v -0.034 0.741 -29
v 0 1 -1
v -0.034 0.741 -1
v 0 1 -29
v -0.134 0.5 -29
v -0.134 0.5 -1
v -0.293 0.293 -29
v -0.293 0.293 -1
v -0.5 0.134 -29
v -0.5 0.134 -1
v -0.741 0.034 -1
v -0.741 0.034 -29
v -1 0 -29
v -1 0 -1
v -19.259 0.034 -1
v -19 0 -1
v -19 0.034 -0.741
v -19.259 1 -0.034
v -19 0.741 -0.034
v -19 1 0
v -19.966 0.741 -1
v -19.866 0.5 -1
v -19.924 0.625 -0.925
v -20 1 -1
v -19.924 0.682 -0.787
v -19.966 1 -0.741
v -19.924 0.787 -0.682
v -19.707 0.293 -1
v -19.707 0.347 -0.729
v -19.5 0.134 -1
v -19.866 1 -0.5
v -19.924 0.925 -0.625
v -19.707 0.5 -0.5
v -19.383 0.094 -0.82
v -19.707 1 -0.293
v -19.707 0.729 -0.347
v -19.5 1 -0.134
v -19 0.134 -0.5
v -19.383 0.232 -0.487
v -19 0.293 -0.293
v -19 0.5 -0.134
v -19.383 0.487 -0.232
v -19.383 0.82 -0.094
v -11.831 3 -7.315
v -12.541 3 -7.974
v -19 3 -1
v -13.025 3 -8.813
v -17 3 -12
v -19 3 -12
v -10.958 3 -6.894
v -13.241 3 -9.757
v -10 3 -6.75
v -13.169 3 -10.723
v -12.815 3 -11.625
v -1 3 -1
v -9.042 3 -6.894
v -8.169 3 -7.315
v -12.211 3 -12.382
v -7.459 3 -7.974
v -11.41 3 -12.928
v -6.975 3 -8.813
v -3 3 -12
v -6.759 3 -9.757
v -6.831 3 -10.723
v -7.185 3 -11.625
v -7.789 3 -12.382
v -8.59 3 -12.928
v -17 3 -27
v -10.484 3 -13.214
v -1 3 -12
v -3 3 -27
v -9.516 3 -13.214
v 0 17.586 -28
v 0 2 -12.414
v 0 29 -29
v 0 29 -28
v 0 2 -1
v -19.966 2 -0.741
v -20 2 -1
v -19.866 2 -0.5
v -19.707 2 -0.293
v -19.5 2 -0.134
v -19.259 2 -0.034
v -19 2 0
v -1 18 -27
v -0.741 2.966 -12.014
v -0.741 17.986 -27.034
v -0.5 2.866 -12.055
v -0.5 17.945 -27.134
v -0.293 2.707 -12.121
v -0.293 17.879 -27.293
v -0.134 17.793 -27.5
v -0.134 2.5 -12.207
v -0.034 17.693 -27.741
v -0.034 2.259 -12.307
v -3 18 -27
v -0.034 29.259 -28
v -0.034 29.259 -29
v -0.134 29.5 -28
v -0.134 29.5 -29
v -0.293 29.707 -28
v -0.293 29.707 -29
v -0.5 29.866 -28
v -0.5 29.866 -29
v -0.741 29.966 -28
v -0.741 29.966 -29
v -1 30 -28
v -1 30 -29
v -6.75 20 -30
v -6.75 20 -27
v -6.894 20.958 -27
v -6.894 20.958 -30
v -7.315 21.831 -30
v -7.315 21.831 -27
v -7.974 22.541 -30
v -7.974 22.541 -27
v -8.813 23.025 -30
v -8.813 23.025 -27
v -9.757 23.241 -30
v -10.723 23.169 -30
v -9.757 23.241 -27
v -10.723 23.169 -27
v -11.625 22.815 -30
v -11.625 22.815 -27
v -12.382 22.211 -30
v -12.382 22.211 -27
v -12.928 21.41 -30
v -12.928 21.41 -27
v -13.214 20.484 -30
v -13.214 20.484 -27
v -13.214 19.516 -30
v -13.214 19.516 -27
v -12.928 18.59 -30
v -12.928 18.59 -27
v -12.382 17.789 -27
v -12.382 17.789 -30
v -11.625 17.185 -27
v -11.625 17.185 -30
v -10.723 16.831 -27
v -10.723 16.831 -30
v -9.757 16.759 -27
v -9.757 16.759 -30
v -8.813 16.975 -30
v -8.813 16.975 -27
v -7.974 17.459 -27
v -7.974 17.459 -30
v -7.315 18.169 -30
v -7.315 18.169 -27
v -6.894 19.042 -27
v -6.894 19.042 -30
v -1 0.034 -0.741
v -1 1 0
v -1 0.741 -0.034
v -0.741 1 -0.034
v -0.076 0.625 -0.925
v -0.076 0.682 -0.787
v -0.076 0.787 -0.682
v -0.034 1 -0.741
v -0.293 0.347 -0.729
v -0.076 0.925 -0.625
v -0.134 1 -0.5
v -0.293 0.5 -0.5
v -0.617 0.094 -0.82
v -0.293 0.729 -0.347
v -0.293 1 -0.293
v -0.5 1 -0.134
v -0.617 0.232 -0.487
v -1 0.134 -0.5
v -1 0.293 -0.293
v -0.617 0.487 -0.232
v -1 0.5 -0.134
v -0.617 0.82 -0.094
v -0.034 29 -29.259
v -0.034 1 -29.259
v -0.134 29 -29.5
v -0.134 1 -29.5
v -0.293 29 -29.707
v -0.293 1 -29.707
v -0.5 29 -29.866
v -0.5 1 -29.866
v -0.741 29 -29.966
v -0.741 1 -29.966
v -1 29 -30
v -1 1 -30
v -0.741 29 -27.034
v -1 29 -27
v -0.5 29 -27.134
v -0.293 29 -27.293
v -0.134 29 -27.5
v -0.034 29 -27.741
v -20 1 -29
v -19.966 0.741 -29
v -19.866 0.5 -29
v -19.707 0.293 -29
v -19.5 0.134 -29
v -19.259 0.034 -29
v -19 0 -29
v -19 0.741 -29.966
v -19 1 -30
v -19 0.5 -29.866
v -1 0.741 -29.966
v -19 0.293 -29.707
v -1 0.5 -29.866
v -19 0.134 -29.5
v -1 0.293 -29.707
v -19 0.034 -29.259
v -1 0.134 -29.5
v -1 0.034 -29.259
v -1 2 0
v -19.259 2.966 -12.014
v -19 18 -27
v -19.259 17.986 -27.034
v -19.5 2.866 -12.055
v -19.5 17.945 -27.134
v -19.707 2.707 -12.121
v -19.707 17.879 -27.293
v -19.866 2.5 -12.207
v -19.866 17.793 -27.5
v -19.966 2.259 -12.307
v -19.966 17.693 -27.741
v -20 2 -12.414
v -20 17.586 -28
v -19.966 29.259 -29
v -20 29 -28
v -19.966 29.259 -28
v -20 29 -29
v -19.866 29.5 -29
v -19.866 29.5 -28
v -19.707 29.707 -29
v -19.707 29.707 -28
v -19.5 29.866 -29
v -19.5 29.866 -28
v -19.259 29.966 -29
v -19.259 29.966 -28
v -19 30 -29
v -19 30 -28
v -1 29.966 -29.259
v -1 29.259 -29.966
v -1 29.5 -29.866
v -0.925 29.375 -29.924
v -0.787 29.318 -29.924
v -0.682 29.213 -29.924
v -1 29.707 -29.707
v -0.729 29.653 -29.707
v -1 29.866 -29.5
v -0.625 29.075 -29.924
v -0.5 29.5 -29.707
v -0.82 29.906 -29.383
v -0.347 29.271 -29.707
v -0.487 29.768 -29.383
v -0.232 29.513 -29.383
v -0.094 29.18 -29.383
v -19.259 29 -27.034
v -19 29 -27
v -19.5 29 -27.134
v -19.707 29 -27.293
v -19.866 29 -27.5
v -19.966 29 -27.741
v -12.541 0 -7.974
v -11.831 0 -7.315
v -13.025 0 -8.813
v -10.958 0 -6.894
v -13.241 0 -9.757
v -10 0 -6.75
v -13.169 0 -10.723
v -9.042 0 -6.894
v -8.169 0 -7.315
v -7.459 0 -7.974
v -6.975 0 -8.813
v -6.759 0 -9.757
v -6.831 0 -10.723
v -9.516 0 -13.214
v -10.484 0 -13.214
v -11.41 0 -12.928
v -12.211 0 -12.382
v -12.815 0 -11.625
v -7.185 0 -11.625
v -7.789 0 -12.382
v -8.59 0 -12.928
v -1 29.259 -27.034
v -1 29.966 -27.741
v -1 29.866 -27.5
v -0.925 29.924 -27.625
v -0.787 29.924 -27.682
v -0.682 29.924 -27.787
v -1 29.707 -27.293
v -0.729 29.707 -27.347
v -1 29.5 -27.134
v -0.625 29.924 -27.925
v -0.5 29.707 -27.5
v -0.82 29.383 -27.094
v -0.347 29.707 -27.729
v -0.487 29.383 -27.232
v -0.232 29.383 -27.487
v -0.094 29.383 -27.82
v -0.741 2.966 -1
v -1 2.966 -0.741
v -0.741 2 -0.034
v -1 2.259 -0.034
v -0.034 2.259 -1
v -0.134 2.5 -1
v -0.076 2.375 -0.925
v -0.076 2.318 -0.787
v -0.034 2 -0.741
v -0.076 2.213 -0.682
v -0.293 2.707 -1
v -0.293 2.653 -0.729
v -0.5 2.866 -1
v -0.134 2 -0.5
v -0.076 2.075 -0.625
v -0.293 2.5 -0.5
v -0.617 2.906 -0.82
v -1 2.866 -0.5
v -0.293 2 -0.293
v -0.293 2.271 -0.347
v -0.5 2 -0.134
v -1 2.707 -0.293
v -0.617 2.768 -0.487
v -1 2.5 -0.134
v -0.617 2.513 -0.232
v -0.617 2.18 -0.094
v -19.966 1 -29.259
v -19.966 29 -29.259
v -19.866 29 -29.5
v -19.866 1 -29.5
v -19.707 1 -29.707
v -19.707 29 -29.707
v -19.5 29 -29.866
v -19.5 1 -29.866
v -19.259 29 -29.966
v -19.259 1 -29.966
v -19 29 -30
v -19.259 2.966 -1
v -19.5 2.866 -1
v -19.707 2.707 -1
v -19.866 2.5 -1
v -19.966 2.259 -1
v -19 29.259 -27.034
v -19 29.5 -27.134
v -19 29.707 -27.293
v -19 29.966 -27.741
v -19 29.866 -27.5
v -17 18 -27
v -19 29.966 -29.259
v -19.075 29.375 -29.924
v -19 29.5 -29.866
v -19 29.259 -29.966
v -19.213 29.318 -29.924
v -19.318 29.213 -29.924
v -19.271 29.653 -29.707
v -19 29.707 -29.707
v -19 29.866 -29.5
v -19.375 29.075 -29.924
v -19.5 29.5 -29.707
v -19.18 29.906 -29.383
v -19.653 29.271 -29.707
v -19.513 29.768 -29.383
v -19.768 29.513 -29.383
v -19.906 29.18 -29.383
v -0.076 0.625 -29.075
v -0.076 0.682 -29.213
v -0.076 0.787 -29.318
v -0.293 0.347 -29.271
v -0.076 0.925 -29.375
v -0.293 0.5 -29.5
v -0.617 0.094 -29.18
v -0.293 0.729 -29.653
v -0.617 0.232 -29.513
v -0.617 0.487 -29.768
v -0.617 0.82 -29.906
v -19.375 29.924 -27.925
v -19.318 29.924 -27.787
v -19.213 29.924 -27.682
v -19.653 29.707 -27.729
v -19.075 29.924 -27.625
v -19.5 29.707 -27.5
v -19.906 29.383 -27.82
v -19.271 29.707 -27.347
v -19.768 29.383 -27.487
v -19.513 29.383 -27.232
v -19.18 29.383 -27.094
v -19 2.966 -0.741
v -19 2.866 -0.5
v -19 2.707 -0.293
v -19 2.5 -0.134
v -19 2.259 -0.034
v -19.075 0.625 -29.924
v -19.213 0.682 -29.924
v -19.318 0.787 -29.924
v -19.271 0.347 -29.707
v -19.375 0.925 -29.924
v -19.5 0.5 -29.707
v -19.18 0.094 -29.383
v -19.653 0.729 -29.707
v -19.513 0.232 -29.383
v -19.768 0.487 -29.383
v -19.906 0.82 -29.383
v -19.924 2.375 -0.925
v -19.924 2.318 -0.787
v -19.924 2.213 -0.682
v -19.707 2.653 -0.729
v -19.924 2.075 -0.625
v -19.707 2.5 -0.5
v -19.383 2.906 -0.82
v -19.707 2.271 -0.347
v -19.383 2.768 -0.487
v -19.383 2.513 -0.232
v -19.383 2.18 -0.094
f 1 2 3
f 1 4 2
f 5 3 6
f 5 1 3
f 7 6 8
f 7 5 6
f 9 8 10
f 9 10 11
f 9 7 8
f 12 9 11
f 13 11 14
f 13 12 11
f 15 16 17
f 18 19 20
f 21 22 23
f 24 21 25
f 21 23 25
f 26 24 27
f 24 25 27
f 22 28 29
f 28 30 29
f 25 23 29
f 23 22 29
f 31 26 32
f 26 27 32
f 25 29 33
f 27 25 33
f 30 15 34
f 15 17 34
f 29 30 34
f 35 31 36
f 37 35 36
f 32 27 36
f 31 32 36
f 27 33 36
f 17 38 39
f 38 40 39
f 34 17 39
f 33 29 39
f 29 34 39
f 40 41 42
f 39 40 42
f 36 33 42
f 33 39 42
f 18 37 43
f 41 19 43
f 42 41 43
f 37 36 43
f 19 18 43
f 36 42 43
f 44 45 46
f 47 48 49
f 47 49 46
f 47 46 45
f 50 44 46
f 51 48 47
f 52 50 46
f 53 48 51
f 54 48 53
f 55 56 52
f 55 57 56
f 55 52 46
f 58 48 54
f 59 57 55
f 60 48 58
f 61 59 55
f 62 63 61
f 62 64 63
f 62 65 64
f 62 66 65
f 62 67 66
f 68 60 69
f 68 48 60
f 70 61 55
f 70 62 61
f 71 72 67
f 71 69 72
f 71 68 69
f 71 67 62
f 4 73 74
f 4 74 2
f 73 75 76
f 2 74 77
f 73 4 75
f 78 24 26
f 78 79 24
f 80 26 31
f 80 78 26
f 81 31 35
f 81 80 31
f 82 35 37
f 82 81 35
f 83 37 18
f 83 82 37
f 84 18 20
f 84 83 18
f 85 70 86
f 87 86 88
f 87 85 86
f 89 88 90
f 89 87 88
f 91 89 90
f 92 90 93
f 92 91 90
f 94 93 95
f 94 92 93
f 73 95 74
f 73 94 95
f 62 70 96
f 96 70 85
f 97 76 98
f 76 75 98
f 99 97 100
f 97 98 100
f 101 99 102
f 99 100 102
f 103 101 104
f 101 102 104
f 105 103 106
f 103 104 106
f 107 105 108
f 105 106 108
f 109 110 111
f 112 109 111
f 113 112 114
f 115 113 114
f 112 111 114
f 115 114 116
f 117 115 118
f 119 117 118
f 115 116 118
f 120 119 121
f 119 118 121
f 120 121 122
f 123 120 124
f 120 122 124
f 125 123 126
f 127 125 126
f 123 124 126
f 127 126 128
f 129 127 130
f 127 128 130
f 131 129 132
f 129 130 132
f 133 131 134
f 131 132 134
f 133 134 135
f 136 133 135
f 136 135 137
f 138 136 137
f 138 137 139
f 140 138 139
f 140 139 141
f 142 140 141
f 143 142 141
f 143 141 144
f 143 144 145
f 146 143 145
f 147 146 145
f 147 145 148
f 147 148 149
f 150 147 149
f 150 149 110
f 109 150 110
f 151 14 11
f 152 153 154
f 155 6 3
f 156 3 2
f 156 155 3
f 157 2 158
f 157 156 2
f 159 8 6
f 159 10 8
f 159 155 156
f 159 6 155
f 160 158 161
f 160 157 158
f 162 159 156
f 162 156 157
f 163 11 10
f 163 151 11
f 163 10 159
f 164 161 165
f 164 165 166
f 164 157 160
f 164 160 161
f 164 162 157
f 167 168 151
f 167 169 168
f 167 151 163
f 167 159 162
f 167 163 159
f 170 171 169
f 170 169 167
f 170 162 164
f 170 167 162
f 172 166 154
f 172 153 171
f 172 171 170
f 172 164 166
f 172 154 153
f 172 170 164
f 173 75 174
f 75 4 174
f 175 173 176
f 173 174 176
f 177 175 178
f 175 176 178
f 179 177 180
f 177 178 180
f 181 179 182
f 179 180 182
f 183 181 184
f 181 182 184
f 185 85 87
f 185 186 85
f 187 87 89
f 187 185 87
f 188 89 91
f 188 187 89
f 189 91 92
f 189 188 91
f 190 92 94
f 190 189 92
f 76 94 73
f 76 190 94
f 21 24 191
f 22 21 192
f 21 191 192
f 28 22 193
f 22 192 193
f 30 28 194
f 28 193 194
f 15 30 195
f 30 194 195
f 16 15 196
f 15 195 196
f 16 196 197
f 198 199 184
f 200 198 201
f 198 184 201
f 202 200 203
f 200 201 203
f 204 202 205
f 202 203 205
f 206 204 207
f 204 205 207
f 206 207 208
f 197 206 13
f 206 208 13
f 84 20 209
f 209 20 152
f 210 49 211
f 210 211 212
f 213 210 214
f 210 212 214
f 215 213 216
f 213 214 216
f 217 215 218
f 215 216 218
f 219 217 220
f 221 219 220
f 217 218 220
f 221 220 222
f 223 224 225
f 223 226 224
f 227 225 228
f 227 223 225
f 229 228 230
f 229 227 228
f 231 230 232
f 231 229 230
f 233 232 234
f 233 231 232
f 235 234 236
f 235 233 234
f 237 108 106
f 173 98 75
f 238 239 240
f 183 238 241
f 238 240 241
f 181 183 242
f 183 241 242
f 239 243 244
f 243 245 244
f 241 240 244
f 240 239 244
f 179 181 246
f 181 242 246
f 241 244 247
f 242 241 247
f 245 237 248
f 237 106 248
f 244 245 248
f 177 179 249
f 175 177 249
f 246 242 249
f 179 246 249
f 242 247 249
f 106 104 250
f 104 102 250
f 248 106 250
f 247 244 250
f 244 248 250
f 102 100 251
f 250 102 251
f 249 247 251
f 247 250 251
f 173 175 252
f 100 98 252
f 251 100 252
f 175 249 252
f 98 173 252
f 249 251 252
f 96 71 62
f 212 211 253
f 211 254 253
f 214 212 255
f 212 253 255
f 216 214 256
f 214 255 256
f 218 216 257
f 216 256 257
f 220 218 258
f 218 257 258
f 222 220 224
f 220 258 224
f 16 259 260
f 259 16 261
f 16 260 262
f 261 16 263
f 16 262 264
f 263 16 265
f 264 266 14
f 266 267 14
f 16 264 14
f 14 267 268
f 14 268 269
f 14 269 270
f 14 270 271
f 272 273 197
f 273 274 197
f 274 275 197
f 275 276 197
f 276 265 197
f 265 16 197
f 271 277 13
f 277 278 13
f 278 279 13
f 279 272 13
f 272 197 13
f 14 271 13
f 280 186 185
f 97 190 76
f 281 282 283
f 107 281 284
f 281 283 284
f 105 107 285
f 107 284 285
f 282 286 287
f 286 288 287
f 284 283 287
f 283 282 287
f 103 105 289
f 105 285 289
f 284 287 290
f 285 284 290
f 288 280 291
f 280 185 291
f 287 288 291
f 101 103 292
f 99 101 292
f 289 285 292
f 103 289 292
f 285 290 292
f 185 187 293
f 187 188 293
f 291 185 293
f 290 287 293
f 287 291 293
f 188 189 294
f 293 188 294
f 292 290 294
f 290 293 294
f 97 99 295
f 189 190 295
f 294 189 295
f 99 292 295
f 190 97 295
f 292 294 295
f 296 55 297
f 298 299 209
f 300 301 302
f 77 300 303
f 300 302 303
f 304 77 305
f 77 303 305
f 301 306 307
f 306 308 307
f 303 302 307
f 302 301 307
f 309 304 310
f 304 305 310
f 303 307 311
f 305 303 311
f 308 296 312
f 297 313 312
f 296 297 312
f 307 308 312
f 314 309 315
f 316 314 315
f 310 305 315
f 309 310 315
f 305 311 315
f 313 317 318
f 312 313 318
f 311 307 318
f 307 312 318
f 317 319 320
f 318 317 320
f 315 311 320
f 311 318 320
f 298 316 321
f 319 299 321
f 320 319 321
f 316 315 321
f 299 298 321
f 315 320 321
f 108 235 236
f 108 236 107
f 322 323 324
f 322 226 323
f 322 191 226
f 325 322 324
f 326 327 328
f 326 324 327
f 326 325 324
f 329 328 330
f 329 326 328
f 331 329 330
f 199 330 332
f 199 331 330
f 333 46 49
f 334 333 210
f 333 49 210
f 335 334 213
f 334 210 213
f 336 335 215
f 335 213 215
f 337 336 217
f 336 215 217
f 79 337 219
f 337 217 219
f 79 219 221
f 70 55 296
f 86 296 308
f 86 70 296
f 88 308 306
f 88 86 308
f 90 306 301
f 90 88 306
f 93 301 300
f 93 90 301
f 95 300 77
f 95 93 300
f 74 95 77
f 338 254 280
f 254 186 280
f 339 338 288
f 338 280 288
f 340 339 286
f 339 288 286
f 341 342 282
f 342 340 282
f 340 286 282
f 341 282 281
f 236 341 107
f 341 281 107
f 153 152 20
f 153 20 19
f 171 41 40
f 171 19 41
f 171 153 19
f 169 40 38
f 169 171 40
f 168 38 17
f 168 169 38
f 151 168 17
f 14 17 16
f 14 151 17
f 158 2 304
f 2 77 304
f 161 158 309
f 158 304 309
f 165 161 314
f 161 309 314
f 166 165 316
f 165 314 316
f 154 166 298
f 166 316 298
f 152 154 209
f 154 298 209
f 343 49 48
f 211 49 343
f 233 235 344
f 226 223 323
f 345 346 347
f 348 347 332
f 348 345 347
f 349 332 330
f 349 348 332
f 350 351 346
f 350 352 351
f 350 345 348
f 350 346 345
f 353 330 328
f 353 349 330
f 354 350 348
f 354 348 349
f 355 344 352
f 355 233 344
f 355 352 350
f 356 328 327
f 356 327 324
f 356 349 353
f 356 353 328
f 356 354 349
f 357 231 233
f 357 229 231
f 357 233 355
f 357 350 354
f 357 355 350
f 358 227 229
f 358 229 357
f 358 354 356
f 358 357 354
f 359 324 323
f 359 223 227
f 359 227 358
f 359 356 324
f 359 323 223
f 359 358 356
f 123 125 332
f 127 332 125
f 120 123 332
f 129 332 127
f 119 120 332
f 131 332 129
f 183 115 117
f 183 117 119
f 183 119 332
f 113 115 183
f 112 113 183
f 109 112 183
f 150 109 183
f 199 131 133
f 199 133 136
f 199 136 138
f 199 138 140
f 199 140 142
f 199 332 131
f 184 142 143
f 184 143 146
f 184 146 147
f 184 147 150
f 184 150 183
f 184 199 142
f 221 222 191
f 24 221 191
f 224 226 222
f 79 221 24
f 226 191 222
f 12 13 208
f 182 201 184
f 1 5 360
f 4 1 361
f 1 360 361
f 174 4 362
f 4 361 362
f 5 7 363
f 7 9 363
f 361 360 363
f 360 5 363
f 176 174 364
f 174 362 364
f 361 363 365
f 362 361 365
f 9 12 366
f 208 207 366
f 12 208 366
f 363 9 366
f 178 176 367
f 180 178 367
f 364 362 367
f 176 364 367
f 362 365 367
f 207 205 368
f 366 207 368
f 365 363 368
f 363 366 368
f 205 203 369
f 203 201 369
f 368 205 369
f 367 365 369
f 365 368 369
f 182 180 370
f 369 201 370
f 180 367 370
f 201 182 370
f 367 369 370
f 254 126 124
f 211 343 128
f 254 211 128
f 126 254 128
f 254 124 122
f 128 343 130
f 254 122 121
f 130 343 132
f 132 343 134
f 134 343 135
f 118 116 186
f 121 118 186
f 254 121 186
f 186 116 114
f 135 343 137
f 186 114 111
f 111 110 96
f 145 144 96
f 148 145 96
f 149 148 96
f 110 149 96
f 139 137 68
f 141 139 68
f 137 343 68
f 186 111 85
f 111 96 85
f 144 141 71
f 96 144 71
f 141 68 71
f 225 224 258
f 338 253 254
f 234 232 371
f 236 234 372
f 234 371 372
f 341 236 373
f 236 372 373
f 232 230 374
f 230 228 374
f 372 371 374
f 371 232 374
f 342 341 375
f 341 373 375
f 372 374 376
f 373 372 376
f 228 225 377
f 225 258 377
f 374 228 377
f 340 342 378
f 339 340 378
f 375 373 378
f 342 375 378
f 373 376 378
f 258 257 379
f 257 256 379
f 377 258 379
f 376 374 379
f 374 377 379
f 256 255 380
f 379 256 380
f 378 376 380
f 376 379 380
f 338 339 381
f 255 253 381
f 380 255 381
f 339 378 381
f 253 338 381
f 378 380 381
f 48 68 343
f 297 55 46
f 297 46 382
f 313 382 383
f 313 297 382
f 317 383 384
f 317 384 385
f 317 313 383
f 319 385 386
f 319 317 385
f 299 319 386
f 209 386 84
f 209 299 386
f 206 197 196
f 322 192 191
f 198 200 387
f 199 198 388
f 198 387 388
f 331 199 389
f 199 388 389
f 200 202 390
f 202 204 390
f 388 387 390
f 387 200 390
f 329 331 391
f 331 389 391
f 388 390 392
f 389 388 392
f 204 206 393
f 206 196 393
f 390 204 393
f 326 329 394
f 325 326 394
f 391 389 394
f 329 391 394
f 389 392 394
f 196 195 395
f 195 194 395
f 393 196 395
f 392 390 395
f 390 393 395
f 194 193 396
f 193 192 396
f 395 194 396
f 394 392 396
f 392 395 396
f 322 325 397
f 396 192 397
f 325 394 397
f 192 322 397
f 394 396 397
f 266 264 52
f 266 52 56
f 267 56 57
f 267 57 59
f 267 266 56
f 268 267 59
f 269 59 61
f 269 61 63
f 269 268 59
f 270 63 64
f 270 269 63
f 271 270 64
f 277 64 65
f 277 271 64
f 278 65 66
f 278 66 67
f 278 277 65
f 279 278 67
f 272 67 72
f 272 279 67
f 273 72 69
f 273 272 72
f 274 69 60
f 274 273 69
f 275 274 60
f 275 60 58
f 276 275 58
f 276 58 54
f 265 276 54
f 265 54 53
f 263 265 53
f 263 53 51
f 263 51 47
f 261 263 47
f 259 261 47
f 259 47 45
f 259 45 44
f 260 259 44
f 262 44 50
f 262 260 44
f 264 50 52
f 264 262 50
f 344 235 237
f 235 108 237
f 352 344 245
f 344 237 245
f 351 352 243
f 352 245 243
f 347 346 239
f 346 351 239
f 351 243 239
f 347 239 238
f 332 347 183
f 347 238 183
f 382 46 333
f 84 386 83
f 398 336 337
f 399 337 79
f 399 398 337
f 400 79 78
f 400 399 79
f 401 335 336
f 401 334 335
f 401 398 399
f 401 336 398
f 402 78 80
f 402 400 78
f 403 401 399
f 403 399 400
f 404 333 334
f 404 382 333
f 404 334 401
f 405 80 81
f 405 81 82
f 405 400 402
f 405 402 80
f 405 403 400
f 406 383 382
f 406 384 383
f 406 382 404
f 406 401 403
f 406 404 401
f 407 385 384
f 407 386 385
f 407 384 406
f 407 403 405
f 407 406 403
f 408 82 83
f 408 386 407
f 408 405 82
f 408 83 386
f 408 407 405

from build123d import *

# Parameters (mm, degrees)
SKETCH1_W           = 20
SKETCH1_H           = 30
SKETCH1_R           = 3.25
BOSS_EXTRUDE1_DEPTH = 3
SKETCH2_W           = 20
SKETCH2_H           = 3
BOSS_EXTRUDE2_DEPTH = 27
SKETCH3_R           = 3.25
CUT_EXTRUDE1_DEPTH  = 46.044422518
BOSS_EXTRUDE3_DEPTH = 3
FILLET1_R           = 1


with BuildPart() as part:
    # Sketch1 → Boss-Extrude1 (new body)
    with BuildSketch(Plane(origin=(0, 0, 0), x_dir=(1, 0, 0), z_dir=(0, 1, 0))):
        with Locations((-10, 15)):
            Rectangle(SKETCH1_W, SKETCH1_H)
        with Locations(Location((-10, 10, 0), (0, 0, 270))):
            Circle(SKETCH1_R, mode=Mode.SUBTRACT)
    extrude(amount=BOSS_EXTRUDE1_DEPTH)

    # Sketch2 → Boss-Extrude2 (add)
    with BuildSketch(Plane(origin=(0, 3, 0), x_dir=(1, 0, 0), z_dir=(0, 1, 0))):
        with Locations((-10, 28.5)):
            Rectangle(SKETCH2_W, SKETCH2_H)
    extrude(amount=BOSS_EXTRUDE2_DEPTH)

    # Sketch3 → Cut-Extrude1 (cut, through all)
    with BuildSketch(Plane.XY.offset(-27)):
        with Locations((-10, 20)):
            Circle(SKETCH3_R)
    extrude(amount=-CUT_EXTRUDE1_DEPTH, mode=Mode.SUBTRACT)

    # Sketch5 → Boss-Extrude3 (add)
    with BuildSketch(Plane(origin=(0, 0, 0), x_dir=(0, 0, -1), z_dir=(1, 0, 0))):
        Polygon((12, 3), (27, 18), (27, 3), align=None)
    boss_extrude3 = extrude(amount=-BOSS_EXTRUDE3_DEPTH)

    # Mirror1: Boss-Extrude3 across plane
    add(boss_extrude3.mirror(Plane.ZY.offset(10)))

    # Fillet1
    fillet1_edges = [part.edges().sort_by_distance(p)[0] for p in [
        (-10, 3, 0),
        (-20, 24, -27),
        (0, 24, -27),
        (-20, 30, -28.5),
        (-10, 30, -27),
        (0, 30, -28.5),
        (-10, 30, -30),
        (0, 10.5, -19.5),
        (-20, 3, -6),
        (-20, 10.5, -19.5),
        (0, 3, -6),
        (-10, 0, 0),
        (-20, 0, -15),
        (-10, 0, -30),
        (0, 0, -15),
        (0, 1.5, 0),
        (-20, 1.5, 0),
        (-20, 15, -30),
        (0, 15, -30),
    ]]
    fillet(fillet1_edges, radius=FILLET1_R)


solid = part.part
